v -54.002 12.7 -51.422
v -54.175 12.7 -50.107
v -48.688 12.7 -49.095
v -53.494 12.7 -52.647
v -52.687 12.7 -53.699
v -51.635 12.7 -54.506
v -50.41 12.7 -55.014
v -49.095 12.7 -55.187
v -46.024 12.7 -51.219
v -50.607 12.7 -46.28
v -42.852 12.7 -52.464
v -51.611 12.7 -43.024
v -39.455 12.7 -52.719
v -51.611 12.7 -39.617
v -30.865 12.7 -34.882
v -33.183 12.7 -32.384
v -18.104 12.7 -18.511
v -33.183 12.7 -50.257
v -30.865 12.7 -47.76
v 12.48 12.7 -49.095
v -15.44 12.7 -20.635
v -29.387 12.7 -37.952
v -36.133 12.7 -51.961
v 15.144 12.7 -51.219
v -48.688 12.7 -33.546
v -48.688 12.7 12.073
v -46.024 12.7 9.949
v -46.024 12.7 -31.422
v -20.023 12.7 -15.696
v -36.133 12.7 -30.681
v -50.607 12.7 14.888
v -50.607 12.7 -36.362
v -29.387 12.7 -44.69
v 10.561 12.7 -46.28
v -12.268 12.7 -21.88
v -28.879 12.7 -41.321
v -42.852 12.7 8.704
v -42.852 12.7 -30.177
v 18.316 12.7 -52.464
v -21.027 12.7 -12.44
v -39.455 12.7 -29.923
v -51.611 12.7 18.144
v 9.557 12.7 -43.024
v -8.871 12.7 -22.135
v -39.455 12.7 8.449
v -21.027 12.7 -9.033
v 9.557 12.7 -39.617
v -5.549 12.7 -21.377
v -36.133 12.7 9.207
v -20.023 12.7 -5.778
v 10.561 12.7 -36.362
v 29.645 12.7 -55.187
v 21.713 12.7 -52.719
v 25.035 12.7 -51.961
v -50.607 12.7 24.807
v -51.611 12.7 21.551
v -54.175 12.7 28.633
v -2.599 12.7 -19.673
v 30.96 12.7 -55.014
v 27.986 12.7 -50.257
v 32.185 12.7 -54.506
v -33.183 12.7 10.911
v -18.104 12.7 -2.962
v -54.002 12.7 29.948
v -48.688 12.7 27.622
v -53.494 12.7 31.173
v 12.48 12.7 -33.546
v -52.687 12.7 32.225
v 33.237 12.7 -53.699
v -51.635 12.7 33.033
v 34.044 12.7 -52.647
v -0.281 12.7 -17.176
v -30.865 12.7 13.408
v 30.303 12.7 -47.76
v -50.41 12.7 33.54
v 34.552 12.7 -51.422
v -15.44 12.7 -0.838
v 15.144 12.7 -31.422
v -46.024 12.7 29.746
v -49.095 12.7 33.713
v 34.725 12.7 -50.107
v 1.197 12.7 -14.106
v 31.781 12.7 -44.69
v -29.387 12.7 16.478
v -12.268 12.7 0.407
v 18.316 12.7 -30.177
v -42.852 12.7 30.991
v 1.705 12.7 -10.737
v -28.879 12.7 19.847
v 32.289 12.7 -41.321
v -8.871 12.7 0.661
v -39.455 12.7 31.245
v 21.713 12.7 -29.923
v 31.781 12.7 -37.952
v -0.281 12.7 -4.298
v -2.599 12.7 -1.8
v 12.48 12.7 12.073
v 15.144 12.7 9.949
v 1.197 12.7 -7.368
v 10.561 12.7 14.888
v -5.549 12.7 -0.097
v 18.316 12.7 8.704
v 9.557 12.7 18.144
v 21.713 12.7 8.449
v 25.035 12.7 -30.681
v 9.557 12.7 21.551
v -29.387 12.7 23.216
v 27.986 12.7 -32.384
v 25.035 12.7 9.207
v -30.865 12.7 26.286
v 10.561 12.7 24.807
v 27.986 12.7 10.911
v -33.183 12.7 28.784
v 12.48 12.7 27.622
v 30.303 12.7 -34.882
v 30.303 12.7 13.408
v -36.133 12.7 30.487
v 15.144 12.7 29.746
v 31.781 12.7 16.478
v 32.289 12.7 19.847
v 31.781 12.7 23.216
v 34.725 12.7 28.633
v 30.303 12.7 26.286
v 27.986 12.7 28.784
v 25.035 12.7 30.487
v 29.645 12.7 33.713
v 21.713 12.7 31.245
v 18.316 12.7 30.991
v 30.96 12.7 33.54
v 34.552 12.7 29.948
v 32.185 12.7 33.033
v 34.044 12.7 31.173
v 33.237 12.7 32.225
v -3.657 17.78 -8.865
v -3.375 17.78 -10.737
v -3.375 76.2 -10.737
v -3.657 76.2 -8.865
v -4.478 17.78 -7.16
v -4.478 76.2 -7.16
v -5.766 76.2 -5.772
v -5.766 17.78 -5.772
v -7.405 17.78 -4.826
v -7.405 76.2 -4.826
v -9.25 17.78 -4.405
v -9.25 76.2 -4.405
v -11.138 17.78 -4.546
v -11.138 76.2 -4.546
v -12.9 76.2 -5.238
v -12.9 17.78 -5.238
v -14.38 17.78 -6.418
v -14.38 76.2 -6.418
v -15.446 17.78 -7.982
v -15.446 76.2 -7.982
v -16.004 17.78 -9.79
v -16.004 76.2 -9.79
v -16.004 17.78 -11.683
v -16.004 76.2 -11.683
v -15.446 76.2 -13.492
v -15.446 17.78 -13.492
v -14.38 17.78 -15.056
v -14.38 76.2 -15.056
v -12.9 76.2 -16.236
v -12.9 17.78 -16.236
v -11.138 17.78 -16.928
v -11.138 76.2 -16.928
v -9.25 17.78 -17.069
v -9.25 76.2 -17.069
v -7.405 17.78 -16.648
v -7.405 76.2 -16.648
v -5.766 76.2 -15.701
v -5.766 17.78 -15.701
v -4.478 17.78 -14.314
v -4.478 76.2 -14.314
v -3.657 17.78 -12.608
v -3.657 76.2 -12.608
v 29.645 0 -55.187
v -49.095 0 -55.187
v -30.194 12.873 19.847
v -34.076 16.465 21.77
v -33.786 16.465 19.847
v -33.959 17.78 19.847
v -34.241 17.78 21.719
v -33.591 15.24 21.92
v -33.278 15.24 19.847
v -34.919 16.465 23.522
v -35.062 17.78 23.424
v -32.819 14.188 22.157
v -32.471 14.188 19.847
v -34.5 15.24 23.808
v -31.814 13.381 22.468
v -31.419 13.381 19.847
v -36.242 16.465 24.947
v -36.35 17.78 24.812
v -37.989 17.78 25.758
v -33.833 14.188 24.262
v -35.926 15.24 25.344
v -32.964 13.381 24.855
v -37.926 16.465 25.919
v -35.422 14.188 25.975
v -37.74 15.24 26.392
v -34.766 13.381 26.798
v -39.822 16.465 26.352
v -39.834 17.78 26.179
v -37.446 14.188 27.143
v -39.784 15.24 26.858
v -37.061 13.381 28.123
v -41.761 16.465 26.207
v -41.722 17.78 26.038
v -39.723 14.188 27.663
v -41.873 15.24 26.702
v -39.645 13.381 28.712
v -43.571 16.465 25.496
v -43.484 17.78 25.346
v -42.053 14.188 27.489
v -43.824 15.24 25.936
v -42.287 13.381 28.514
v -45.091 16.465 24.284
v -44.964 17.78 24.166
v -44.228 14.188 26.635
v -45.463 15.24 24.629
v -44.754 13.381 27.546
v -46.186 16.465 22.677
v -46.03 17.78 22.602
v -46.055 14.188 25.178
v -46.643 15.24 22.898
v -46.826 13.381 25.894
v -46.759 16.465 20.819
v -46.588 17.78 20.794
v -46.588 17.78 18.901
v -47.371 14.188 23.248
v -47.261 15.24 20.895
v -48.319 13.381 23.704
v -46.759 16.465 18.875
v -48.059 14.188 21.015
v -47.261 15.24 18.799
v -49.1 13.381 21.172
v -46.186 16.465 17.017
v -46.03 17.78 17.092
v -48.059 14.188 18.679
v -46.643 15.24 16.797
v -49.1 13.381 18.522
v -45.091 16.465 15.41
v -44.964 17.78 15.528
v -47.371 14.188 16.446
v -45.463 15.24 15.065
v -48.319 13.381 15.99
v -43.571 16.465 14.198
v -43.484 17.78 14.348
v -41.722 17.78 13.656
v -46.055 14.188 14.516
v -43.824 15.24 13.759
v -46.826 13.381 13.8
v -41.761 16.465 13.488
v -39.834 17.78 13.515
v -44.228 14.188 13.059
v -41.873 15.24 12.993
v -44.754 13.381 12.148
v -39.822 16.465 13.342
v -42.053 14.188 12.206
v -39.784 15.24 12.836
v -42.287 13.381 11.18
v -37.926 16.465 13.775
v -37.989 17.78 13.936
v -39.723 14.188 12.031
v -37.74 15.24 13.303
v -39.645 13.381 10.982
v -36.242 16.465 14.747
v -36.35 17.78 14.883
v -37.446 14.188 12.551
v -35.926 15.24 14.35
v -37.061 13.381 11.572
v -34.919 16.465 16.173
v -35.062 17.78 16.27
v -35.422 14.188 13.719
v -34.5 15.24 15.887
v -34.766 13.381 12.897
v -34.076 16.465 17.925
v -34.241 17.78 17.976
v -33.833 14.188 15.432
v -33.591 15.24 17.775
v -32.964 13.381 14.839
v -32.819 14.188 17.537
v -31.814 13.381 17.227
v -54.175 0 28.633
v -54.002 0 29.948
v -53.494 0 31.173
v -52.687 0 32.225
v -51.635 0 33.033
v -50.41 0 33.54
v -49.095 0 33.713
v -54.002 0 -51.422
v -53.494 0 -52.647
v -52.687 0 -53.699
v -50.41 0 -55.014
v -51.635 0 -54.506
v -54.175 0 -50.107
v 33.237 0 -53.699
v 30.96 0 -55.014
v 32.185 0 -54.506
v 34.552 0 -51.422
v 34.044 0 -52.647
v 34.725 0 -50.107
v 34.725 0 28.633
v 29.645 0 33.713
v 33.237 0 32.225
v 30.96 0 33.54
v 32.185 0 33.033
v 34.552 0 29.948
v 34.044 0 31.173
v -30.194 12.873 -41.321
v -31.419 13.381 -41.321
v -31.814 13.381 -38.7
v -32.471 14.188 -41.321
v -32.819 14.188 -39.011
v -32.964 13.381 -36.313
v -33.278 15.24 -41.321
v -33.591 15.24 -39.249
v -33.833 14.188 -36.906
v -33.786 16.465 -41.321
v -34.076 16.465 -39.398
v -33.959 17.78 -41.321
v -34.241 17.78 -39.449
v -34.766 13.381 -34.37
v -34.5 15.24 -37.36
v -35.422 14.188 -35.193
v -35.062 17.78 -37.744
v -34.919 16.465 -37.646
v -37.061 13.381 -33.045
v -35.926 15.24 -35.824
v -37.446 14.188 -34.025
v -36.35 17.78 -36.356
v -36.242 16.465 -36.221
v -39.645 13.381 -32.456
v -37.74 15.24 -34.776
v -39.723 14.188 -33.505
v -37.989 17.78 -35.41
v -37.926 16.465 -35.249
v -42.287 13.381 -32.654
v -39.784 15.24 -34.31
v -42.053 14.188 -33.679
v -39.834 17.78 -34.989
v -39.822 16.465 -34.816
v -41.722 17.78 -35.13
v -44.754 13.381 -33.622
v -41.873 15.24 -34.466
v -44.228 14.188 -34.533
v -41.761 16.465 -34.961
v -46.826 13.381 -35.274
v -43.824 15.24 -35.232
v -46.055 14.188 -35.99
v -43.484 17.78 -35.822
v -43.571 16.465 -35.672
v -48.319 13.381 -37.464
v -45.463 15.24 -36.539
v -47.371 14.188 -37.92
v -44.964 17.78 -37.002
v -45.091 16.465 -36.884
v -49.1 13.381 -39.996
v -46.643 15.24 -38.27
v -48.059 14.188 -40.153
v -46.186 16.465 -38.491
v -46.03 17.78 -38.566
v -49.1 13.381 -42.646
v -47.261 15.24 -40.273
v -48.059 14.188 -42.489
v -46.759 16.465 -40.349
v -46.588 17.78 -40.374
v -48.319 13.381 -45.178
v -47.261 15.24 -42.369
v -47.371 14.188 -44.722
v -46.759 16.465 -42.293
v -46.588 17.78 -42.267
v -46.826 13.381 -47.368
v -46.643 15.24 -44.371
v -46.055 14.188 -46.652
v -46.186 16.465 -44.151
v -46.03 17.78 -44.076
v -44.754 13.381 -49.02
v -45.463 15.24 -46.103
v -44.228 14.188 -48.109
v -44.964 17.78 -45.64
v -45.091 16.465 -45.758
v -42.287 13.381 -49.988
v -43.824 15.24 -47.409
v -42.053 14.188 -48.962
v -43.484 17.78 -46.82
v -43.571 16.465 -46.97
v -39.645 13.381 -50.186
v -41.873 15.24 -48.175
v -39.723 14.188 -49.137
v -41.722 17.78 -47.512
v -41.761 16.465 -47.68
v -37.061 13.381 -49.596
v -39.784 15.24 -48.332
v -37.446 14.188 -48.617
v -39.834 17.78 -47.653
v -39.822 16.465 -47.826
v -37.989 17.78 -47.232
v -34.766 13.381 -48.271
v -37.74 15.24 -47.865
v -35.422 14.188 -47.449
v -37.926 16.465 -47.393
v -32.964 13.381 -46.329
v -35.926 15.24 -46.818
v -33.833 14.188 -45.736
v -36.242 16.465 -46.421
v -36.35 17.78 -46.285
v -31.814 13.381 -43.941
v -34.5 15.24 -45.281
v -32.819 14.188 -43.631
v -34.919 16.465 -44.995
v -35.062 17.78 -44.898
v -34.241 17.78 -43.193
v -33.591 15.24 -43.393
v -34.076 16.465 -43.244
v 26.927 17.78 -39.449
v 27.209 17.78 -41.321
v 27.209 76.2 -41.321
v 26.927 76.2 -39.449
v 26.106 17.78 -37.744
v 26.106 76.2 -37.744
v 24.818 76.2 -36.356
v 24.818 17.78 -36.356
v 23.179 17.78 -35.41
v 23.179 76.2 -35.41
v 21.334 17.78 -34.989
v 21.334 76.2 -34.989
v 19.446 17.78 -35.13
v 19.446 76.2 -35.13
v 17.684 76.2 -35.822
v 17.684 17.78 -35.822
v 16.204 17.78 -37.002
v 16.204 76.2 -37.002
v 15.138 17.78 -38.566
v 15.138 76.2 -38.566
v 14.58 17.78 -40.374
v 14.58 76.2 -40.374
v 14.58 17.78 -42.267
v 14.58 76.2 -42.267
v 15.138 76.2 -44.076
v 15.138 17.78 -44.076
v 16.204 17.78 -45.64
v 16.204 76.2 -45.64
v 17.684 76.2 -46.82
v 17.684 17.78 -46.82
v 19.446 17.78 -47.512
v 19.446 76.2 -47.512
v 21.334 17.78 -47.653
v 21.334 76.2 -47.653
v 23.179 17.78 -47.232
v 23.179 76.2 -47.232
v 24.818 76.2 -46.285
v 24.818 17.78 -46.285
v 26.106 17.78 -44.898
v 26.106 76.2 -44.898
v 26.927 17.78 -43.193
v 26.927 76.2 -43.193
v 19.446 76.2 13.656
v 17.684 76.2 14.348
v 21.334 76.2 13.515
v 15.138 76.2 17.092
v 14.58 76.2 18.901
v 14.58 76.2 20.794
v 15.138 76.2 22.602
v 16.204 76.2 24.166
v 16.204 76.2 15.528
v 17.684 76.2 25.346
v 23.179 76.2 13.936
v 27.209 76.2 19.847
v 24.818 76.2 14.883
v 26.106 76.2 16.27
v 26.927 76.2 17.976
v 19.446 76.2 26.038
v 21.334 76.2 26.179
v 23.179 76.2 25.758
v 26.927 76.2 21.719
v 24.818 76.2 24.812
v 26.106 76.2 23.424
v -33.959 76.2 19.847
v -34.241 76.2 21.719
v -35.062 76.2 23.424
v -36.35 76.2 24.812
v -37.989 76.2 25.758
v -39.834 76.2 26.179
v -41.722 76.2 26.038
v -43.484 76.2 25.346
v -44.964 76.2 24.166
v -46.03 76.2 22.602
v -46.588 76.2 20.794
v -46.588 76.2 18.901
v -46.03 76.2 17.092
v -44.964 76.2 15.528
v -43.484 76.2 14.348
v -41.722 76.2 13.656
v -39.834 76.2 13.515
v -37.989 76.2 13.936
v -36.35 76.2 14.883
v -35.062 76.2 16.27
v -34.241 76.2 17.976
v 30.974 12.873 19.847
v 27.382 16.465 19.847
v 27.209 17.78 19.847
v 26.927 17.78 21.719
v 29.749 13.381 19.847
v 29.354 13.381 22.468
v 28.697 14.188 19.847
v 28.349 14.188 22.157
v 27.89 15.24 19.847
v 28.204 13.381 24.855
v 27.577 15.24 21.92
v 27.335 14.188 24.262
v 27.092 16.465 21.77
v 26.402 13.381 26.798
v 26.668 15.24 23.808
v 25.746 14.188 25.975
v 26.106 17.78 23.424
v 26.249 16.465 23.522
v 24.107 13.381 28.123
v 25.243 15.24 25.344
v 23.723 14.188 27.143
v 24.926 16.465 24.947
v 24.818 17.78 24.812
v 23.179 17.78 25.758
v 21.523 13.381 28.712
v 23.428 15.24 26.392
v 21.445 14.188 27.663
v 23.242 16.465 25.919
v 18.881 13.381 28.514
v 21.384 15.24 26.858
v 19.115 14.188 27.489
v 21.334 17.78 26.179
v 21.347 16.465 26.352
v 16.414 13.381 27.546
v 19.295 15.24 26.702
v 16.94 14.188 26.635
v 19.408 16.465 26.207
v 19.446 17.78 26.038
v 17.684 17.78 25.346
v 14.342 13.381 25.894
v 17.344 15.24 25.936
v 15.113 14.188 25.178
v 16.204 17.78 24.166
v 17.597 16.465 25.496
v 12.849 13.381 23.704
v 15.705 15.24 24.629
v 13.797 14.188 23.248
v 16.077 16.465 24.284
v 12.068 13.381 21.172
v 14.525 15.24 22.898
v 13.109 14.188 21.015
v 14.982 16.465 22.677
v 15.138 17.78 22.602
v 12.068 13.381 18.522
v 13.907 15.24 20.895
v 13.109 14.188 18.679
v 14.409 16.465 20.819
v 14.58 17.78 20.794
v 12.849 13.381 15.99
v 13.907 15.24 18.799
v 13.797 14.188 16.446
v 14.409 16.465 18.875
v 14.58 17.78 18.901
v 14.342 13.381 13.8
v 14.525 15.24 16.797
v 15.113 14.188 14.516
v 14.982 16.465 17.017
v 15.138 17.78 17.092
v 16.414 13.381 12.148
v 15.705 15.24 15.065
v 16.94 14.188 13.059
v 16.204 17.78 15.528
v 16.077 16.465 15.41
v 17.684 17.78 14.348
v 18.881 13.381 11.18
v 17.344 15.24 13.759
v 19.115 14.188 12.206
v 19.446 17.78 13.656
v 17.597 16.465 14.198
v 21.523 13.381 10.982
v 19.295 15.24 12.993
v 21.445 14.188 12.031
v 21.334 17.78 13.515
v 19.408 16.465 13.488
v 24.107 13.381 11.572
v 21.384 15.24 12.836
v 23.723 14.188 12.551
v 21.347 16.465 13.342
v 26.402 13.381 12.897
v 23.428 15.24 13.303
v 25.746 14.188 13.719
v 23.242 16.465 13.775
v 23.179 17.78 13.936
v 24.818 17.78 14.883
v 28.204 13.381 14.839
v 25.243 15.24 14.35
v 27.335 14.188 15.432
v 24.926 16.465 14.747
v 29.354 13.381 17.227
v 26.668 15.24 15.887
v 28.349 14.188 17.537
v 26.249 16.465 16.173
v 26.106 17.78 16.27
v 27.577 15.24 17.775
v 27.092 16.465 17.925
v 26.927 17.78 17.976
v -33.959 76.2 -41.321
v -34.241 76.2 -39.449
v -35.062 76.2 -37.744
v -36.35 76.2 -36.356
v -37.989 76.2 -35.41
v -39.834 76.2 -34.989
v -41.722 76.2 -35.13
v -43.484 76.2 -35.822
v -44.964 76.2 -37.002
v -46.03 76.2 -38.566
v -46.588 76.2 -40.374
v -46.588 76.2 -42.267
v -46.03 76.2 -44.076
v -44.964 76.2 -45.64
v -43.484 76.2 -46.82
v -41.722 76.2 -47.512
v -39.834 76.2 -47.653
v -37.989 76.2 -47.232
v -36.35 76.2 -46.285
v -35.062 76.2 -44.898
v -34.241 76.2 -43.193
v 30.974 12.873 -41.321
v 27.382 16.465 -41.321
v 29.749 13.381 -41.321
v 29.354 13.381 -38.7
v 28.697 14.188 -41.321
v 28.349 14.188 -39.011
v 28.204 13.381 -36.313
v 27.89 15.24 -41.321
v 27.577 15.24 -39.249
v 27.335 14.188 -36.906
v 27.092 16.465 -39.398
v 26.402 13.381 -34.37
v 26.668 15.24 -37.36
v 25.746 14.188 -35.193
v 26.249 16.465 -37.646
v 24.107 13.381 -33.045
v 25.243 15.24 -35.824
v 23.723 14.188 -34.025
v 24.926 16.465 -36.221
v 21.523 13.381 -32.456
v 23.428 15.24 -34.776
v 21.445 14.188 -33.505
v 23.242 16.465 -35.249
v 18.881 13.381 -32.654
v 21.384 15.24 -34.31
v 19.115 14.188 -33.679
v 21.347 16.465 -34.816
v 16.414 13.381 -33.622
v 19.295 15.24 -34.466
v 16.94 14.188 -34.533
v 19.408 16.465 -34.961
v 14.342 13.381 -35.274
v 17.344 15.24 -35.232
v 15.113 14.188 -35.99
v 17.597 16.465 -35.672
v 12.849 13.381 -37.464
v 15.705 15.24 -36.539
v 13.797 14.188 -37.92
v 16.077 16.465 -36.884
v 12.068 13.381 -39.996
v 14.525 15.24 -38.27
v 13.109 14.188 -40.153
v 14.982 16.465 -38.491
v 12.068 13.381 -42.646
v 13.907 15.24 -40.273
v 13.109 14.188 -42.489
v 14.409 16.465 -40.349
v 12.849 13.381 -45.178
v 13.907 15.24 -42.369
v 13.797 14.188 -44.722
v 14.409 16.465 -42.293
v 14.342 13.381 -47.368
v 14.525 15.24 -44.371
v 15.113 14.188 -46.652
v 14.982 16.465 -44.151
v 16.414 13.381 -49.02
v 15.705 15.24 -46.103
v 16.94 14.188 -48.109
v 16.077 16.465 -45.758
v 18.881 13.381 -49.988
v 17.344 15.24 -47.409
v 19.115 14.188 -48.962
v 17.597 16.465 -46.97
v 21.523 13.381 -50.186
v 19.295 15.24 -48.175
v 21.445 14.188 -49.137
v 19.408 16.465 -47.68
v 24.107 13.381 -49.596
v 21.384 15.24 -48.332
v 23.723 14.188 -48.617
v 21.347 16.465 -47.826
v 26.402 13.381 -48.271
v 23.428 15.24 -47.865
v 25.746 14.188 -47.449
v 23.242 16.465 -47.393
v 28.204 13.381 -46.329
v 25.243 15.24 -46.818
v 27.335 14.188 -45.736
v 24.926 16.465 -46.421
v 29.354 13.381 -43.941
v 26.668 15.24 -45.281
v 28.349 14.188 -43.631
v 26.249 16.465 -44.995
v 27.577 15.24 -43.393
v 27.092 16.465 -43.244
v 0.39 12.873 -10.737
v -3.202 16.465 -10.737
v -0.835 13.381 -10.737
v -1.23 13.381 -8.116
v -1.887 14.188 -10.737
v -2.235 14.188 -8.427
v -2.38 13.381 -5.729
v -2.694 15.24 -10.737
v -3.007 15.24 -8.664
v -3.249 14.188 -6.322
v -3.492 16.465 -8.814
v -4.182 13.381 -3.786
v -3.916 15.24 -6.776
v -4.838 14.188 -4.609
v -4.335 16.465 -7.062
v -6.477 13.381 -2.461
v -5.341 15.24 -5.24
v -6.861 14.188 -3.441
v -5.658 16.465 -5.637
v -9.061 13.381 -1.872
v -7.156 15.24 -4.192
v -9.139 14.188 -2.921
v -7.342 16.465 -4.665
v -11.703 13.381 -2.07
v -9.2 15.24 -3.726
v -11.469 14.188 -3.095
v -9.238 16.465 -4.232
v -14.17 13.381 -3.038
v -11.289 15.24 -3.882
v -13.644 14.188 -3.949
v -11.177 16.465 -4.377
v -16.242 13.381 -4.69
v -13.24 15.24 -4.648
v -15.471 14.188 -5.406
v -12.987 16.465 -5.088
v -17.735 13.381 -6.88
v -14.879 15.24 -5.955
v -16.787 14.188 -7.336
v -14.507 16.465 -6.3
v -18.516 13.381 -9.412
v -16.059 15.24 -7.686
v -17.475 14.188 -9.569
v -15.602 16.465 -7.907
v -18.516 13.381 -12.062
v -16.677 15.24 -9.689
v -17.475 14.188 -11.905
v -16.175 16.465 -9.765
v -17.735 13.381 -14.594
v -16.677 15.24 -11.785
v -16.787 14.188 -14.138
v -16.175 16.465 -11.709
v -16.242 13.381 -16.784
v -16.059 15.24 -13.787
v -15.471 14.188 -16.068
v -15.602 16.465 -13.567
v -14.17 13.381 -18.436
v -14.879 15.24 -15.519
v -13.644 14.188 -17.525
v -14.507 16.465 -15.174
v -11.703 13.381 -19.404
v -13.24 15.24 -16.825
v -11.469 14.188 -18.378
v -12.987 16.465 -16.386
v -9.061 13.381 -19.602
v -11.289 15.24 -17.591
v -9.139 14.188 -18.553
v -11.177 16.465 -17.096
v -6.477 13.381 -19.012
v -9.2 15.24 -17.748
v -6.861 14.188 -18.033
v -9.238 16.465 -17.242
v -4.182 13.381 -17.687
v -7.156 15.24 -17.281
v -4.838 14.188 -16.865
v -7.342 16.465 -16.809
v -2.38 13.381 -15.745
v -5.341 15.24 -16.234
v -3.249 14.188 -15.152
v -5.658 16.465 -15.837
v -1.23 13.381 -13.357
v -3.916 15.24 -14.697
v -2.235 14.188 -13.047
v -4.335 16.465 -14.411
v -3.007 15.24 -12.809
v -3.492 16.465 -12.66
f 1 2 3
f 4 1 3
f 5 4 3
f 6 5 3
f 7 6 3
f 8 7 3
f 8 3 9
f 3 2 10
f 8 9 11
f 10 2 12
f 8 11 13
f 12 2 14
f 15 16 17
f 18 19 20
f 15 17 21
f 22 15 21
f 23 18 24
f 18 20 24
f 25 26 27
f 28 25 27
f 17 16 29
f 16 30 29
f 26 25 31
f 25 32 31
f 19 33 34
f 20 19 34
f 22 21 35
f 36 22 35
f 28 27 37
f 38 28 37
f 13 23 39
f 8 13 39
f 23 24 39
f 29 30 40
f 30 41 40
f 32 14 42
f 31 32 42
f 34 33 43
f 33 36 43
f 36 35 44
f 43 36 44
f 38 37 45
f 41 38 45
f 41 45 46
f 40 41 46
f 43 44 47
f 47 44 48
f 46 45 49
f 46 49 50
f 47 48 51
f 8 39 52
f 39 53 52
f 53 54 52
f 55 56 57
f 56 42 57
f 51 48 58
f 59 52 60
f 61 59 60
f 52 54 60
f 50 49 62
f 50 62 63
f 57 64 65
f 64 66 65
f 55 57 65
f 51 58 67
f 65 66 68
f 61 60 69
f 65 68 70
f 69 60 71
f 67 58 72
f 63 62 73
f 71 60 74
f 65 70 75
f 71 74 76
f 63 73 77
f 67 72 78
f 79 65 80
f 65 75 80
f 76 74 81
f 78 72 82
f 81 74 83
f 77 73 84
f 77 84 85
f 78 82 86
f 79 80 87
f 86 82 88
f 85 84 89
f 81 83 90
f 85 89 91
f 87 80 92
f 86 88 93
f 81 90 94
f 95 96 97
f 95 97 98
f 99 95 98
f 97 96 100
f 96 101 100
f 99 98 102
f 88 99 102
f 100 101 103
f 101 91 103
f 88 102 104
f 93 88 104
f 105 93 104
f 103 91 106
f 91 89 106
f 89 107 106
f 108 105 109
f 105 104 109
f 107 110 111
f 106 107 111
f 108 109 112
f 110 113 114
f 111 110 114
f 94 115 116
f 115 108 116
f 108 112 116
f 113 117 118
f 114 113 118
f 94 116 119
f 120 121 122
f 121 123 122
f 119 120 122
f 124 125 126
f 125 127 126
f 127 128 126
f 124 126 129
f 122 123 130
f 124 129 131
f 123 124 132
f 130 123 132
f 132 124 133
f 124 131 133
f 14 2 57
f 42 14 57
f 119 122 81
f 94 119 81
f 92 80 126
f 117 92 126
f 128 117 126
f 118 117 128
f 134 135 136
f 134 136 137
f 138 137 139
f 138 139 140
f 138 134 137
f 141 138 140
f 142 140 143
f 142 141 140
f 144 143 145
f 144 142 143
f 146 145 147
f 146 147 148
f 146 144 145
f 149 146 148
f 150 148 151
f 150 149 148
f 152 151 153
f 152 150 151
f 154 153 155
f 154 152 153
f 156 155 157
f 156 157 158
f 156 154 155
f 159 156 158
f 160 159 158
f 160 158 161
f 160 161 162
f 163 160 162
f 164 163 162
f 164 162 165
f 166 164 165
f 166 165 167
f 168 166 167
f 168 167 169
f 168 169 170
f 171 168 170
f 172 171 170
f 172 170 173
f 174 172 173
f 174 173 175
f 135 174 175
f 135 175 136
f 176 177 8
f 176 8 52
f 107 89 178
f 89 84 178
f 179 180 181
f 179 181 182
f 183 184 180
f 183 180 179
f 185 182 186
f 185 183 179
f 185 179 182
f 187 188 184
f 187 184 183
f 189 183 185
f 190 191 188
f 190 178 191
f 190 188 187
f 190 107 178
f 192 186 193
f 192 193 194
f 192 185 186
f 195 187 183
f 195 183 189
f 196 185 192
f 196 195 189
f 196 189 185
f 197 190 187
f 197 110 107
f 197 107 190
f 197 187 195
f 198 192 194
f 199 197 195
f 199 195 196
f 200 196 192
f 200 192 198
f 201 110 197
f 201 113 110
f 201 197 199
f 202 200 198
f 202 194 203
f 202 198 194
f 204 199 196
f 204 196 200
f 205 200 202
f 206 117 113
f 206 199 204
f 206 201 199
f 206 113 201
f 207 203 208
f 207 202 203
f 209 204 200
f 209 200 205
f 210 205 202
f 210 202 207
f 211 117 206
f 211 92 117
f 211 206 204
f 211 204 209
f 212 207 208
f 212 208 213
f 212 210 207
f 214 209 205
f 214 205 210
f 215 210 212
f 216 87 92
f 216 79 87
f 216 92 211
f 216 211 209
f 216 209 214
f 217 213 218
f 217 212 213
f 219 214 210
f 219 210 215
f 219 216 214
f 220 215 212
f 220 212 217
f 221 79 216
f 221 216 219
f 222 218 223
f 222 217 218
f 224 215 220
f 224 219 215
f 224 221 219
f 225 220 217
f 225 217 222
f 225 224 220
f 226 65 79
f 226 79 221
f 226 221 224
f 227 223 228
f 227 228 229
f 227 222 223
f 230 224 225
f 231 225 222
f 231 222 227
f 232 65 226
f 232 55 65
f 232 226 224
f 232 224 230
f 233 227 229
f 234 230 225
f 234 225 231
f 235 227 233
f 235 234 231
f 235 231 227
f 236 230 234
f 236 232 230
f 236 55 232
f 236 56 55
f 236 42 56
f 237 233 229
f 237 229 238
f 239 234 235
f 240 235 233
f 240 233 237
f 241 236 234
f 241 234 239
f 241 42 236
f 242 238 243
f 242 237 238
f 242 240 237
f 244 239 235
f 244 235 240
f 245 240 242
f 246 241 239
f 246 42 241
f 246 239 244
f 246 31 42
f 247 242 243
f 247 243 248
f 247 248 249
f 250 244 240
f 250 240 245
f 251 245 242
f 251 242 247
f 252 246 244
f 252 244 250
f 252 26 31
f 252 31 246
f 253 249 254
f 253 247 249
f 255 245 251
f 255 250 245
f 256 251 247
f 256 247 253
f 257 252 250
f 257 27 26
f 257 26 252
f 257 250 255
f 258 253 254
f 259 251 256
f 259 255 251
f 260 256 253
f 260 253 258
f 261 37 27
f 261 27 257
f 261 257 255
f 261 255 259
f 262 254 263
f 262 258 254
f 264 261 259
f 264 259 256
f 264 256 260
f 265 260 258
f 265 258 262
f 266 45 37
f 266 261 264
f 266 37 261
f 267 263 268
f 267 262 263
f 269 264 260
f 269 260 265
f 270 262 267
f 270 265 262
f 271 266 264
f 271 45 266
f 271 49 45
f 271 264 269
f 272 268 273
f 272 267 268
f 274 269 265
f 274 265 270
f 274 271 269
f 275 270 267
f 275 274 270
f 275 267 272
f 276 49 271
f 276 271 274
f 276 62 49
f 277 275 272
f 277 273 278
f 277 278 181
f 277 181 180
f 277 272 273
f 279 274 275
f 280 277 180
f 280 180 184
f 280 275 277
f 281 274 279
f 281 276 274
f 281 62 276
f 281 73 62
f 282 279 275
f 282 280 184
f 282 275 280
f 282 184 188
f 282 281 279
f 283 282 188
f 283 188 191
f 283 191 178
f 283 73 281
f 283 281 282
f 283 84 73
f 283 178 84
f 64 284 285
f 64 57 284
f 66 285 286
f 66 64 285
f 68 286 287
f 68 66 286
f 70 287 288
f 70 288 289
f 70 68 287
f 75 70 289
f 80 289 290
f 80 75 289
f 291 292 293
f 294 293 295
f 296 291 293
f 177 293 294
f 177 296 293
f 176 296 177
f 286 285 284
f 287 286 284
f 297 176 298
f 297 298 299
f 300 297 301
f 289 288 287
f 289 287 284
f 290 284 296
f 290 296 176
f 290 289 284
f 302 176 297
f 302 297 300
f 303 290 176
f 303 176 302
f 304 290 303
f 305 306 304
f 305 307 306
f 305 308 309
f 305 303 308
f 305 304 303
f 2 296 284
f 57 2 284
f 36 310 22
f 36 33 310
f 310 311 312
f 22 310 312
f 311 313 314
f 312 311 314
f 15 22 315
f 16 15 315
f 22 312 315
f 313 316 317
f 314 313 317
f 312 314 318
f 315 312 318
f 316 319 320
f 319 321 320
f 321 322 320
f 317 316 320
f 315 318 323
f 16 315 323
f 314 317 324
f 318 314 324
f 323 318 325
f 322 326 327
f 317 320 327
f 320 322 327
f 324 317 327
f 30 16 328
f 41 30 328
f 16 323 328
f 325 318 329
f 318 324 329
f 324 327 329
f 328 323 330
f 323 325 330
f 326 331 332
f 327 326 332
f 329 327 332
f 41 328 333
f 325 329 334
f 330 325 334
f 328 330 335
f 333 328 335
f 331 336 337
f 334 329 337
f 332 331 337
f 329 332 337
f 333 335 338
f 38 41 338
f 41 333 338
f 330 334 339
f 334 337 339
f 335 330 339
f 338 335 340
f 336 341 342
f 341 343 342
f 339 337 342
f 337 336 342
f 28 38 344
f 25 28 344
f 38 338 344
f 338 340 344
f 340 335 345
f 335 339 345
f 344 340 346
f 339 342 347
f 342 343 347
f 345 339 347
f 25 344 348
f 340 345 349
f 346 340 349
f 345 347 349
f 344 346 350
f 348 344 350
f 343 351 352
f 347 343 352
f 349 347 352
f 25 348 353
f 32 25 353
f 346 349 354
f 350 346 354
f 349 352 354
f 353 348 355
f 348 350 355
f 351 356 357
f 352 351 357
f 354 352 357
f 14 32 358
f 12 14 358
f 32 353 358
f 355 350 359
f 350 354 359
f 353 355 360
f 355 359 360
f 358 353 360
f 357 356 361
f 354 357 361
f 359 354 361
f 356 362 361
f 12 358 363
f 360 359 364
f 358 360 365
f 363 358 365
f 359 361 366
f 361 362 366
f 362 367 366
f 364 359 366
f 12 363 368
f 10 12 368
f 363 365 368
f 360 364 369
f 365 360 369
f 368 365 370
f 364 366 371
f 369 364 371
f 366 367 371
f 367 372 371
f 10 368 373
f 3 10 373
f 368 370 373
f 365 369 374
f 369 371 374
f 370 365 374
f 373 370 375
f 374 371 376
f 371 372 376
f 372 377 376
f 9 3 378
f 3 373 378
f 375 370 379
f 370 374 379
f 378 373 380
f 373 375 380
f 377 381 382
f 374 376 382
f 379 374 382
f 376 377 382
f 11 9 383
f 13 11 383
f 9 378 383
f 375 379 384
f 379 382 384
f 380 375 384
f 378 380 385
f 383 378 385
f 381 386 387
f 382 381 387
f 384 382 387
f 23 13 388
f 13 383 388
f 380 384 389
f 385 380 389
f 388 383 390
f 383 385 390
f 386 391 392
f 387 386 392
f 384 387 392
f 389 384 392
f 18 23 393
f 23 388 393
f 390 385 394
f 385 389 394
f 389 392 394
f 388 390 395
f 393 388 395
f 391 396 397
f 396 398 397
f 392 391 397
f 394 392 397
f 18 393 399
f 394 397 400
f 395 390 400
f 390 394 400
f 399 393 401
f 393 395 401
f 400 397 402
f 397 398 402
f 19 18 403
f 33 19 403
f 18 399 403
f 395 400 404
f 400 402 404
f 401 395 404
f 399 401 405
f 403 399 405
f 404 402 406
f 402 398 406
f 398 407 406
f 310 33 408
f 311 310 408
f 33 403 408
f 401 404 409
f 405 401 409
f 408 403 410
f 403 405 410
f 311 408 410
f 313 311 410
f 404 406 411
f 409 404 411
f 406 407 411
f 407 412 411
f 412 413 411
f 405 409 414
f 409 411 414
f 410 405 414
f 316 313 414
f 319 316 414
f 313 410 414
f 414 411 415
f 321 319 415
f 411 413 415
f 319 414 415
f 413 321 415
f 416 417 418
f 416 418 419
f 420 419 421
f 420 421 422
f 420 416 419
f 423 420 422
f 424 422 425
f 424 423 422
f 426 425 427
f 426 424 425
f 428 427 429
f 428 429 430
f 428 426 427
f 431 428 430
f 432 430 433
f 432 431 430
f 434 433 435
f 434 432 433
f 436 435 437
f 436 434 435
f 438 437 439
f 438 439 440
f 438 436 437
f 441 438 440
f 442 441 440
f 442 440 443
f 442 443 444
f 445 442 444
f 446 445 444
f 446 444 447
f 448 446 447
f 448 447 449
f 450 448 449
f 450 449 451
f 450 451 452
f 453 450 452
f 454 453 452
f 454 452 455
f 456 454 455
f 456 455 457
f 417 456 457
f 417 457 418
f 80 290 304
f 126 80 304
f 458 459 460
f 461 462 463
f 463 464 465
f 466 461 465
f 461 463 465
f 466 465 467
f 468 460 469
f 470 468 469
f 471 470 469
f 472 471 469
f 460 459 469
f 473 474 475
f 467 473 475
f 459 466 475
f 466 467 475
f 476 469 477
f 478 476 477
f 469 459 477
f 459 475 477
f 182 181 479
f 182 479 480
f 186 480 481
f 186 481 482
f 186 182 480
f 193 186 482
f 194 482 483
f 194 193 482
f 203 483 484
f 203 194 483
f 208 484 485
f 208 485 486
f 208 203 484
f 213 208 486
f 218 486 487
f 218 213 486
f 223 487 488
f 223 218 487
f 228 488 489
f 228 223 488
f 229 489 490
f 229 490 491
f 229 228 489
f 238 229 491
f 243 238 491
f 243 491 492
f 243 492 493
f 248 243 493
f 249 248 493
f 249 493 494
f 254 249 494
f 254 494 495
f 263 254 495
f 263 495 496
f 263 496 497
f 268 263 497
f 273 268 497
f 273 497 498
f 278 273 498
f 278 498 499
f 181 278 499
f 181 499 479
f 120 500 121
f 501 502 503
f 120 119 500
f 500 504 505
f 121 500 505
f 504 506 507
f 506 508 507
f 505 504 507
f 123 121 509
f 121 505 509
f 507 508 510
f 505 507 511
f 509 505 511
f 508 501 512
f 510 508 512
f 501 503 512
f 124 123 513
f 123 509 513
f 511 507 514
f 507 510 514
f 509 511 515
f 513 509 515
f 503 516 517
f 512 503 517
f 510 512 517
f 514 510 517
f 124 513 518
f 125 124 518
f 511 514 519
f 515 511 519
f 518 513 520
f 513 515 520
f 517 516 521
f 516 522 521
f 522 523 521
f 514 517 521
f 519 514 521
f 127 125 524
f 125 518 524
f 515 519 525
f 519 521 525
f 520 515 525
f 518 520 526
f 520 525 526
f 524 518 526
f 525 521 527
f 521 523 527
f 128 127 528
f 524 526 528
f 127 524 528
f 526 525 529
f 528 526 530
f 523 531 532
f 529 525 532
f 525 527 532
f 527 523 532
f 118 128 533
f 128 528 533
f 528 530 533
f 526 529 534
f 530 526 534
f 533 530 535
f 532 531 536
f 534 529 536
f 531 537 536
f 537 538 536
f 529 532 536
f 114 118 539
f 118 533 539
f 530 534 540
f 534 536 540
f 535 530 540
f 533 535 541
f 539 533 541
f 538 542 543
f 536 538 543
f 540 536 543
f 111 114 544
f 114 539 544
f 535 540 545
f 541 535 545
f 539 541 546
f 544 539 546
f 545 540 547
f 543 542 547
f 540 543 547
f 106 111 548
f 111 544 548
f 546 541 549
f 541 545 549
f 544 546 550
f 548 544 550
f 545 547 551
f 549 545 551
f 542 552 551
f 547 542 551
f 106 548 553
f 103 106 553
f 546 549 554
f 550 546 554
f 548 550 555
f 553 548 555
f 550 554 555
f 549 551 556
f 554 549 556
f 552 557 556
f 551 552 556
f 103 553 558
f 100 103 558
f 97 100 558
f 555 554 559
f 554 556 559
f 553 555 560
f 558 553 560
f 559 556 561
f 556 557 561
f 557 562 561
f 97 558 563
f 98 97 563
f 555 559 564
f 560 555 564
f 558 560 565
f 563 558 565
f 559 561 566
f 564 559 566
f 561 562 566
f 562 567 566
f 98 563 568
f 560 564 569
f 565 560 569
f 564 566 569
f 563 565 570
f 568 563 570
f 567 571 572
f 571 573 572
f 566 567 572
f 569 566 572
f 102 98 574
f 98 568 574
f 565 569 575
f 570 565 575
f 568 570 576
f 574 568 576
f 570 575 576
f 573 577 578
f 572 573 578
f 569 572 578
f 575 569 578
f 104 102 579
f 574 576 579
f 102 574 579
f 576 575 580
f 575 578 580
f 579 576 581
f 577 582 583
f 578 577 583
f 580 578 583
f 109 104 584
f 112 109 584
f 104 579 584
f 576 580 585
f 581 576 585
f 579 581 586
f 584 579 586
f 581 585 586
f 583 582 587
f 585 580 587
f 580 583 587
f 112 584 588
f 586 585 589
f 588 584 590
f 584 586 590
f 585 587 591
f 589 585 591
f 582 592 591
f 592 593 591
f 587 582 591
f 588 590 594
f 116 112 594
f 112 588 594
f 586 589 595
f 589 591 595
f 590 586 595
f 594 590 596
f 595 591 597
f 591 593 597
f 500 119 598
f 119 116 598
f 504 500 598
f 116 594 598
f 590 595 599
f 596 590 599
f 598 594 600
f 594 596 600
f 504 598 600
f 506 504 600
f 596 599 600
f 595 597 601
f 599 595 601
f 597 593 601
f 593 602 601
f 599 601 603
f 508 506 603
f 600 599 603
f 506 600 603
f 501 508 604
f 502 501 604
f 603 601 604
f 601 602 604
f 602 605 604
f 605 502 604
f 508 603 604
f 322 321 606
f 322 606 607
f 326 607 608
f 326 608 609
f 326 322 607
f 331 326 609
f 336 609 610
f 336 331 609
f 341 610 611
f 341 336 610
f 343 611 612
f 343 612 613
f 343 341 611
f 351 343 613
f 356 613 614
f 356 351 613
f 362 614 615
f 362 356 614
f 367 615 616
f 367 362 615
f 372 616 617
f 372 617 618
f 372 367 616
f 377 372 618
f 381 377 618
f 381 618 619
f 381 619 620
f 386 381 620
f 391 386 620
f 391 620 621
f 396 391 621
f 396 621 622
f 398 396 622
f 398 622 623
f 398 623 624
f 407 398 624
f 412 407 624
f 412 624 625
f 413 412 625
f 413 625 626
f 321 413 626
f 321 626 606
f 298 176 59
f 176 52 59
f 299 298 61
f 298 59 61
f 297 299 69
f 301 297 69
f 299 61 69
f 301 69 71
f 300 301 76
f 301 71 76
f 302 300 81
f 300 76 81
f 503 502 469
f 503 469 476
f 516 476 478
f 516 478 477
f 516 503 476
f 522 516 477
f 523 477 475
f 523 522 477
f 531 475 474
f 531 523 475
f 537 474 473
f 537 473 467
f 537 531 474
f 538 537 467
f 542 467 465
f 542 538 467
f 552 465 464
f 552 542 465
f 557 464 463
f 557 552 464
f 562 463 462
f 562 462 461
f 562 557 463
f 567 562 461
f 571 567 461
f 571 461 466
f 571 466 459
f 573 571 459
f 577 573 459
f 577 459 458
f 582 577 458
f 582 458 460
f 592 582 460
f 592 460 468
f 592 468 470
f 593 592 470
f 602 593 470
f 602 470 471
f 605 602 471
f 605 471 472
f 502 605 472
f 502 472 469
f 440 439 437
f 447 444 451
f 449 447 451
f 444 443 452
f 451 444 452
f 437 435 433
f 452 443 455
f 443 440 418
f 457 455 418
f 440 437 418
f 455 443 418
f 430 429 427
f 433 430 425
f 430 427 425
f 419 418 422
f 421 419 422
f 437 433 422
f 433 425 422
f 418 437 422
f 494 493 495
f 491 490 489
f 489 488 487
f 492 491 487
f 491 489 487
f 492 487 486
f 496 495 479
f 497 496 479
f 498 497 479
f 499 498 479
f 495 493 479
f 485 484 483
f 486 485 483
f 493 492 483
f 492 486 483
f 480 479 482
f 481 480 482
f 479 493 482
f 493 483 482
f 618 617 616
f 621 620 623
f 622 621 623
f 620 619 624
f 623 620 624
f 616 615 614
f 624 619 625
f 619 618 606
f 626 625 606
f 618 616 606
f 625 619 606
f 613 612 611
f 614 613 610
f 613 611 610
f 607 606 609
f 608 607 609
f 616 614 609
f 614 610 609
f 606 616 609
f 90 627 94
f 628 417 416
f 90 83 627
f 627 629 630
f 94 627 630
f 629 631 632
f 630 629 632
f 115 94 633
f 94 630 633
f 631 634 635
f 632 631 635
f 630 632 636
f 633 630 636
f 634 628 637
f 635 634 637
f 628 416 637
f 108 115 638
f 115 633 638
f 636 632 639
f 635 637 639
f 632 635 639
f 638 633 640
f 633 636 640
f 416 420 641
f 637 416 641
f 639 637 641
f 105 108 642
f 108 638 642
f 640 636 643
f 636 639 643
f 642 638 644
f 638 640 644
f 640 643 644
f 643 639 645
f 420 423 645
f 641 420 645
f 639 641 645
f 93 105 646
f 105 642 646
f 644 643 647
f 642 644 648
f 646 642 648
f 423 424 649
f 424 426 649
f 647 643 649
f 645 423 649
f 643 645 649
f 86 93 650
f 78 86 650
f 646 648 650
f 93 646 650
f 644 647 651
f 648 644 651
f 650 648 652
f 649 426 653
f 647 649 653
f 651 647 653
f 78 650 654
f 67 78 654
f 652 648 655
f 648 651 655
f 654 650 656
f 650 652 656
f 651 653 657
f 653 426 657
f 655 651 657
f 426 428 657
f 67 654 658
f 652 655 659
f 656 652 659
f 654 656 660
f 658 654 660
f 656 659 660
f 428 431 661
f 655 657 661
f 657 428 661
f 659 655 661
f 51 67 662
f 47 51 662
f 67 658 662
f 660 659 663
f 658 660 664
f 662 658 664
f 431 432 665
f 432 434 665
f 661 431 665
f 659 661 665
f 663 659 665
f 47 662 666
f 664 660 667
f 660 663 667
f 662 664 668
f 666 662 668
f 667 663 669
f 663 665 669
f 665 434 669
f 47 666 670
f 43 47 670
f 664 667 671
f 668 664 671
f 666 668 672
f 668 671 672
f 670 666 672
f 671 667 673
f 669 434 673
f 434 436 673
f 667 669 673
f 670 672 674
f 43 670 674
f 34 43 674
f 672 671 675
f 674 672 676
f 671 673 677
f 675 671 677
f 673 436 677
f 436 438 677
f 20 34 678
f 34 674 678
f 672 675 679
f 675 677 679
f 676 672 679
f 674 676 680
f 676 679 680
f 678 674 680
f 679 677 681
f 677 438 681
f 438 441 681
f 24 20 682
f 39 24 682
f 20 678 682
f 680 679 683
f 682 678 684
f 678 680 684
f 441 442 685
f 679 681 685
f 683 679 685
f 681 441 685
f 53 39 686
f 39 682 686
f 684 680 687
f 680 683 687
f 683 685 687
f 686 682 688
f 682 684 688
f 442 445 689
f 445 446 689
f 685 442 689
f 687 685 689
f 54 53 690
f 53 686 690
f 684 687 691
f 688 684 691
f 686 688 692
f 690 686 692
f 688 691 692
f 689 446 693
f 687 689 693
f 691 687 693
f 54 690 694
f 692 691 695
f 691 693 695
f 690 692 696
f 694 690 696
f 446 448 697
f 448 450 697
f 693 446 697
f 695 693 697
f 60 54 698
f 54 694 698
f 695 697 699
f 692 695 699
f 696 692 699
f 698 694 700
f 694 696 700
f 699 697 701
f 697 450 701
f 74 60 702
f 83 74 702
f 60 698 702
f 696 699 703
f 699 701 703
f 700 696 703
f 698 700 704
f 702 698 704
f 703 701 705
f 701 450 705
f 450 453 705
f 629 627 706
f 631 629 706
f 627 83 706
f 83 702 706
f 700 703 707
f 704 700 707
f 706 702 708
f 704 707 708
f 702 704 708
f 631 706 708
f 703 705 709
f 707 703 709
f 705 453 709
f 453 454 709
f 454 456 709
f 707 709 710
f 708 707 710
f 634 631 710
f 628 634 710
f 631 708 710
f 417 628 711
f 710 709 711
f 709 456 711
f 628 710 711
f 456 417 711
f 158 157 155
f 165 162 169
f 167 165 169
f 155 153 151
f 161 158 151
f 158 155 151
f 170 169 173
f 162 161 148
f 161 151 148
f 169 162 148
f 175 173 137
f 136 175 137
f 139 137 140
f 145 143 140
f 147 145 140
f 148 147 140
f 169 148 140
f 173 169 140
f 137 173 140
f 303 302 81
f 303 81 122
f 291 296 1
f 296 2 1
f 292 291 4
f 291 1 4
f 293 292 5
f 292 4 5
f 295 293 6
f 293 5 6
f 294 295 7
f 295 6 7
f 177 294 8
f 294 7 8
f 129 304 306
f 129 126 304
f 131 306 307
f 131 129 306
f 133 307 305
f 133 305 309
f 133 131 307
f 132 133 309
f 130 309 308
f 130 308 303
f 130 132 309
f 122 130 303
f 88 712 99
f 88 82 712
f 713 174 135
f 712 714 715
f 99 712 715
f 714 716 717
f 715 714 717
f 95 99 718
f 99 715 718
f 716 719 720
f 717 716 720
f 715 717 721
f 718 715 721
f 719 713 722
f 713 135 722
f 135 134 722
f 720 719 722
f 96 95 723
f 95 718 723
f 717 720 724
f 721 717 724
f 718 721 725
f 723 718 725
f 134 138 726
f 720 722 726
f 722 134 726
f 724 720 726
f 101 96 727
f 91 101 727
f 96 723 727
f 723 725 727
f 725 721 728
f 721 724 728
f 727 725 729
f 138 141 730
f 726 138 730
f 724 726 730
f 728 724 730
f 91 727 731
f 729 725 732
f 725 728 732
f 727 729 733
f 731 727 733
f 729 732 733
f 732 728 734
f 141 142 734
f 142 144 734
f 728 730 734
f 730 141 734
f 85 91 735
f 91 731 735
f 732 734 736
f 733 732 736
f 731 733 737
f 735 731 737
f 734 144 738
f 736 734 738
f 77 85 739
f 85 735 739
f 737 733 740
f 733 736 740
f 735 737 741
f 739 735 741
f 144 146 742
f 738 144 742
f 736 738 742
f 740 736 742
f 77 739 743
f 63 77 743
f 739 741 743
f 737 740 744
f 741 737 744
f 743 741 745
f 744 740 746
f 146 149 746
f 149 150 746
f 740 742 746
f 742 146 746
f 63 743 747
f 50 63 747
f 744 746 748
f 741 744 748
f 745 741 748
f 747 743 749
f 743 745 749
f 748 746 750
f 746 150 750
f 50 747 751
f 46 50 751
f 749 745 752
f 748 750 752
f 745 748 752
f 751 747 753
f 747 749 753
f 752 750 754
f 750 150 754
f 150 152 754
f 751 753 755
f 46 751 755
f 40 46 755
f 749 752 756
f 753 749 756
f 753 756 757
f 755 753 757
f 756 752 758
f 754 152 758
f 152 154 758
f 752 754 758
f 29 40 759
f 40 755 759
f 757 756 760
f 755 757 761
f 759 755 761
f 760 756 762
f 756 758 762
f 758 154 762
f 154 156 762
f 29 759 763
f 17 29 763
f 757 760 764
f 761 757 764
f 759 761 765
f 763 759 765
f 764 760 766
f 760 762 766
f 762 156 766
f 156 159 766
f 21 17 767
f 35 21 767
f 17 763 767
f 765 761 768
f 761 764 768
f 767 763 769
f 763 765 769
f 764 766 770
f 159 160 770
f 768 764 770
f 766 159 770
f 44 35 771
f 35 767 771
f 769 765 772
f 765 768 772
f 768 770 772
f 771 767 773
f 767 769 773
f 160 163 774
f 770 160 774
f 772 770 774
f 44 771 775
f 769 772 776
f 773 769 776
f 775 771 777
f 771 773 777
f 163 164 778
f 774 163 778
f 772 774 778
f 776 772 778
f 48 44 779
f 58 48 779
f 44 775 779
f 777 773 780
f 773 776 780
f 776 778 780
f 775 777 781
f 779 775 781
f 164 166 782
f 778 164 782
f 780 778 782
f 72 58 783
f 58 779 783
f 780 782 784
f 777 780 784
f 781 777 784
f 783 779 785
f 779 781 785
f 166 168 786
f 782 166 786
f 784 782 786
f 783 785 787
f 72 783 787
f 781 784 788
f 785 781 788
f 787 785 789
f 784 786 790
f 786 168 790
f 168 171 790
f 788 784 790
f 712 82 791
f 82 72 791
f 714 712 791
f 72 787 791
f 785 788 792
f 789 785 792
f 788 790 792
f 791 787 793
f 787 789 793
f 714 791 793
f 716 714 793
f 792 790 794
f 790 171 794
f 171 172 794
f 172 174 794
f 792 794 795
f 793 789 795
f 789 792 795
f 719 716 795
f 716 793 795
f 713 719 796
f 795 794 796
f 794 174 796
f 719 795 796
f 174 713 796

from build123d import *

# Parameters (mm, degrees)
F0_W     = 88.9
F0_H     = 88.9
F0_R     = 6.35
F1_DEPTH = 12.7
F2_DEPTH = 76.2
F3_R     = 5.08


with BuildPart() as f1:
    # F0 (on Front) → F1 (new body)
    with BuildSketch(Plane.XZ):
        with Locations((-9.724989, -10.736793)):
            Rectangle(F0_W, F0_H)
        with Locations((-40.30901, -41.320814)):
            Circle(F0_R, mode=Mode.SUBTRACT)
        with Locations((20.859033, -41.320814)):
            Circle(F0_R, mode=Mode.SUBTRACT)
        with Locations((-40.30901, 19.847229)):
            Circle(F0_R, mode=Mode.SUBTRACT)
        with Locations((-9.724989, -10.736793)):
            Circle(F0_R, mode=Mode.SUBTRACT)
        with Locations((20.859033, 19.847229)):
            Circle(F0_R, mode=Mode.SUBTRACT)
    extrude(amount=-F1_DEPTH)

    # F0 (on Front) → F2 (join)
    with BuildSketch(Plane.XZ):
        with Locations((-40.30901, 19.847229)):
            Circle(F0_R)
        with Locations((20.859033, 19.847229)):
            Circle(F0_R)
        with Locations((-9.724989, -10.736793)):
            Circle(F0_R)
        with Locations((20.859033, -41.320814)):
            Circle(F0_R)
        with Locations((-40.30901, -41.320814)):
            Circle(F0_R)
    extrude(amount=-F2_DEPTH)

    # F3
    f3_edges = [f1.edges().sort_by_distance(p)[0] for p in [
        (34.725011, 6.35, 33.713207),
        (-54.174989, 6.35, 33.713207),
        (-54.174989, 6.35, -55.186793),
        (34.725011, 6.35, -55.186793),
        (14.509033, 12.7, 19.847229),
        (-46.65901, 12.7, 19.847229),
        (-16.074989, 12.7, -10.736793),
        (-46.65901, 12.7, -41.320814),
        (14.509033, 12.7, -41.320814),
    ]]
    fillet(f3_edges, radius=F3_R)


solid = f1.part
